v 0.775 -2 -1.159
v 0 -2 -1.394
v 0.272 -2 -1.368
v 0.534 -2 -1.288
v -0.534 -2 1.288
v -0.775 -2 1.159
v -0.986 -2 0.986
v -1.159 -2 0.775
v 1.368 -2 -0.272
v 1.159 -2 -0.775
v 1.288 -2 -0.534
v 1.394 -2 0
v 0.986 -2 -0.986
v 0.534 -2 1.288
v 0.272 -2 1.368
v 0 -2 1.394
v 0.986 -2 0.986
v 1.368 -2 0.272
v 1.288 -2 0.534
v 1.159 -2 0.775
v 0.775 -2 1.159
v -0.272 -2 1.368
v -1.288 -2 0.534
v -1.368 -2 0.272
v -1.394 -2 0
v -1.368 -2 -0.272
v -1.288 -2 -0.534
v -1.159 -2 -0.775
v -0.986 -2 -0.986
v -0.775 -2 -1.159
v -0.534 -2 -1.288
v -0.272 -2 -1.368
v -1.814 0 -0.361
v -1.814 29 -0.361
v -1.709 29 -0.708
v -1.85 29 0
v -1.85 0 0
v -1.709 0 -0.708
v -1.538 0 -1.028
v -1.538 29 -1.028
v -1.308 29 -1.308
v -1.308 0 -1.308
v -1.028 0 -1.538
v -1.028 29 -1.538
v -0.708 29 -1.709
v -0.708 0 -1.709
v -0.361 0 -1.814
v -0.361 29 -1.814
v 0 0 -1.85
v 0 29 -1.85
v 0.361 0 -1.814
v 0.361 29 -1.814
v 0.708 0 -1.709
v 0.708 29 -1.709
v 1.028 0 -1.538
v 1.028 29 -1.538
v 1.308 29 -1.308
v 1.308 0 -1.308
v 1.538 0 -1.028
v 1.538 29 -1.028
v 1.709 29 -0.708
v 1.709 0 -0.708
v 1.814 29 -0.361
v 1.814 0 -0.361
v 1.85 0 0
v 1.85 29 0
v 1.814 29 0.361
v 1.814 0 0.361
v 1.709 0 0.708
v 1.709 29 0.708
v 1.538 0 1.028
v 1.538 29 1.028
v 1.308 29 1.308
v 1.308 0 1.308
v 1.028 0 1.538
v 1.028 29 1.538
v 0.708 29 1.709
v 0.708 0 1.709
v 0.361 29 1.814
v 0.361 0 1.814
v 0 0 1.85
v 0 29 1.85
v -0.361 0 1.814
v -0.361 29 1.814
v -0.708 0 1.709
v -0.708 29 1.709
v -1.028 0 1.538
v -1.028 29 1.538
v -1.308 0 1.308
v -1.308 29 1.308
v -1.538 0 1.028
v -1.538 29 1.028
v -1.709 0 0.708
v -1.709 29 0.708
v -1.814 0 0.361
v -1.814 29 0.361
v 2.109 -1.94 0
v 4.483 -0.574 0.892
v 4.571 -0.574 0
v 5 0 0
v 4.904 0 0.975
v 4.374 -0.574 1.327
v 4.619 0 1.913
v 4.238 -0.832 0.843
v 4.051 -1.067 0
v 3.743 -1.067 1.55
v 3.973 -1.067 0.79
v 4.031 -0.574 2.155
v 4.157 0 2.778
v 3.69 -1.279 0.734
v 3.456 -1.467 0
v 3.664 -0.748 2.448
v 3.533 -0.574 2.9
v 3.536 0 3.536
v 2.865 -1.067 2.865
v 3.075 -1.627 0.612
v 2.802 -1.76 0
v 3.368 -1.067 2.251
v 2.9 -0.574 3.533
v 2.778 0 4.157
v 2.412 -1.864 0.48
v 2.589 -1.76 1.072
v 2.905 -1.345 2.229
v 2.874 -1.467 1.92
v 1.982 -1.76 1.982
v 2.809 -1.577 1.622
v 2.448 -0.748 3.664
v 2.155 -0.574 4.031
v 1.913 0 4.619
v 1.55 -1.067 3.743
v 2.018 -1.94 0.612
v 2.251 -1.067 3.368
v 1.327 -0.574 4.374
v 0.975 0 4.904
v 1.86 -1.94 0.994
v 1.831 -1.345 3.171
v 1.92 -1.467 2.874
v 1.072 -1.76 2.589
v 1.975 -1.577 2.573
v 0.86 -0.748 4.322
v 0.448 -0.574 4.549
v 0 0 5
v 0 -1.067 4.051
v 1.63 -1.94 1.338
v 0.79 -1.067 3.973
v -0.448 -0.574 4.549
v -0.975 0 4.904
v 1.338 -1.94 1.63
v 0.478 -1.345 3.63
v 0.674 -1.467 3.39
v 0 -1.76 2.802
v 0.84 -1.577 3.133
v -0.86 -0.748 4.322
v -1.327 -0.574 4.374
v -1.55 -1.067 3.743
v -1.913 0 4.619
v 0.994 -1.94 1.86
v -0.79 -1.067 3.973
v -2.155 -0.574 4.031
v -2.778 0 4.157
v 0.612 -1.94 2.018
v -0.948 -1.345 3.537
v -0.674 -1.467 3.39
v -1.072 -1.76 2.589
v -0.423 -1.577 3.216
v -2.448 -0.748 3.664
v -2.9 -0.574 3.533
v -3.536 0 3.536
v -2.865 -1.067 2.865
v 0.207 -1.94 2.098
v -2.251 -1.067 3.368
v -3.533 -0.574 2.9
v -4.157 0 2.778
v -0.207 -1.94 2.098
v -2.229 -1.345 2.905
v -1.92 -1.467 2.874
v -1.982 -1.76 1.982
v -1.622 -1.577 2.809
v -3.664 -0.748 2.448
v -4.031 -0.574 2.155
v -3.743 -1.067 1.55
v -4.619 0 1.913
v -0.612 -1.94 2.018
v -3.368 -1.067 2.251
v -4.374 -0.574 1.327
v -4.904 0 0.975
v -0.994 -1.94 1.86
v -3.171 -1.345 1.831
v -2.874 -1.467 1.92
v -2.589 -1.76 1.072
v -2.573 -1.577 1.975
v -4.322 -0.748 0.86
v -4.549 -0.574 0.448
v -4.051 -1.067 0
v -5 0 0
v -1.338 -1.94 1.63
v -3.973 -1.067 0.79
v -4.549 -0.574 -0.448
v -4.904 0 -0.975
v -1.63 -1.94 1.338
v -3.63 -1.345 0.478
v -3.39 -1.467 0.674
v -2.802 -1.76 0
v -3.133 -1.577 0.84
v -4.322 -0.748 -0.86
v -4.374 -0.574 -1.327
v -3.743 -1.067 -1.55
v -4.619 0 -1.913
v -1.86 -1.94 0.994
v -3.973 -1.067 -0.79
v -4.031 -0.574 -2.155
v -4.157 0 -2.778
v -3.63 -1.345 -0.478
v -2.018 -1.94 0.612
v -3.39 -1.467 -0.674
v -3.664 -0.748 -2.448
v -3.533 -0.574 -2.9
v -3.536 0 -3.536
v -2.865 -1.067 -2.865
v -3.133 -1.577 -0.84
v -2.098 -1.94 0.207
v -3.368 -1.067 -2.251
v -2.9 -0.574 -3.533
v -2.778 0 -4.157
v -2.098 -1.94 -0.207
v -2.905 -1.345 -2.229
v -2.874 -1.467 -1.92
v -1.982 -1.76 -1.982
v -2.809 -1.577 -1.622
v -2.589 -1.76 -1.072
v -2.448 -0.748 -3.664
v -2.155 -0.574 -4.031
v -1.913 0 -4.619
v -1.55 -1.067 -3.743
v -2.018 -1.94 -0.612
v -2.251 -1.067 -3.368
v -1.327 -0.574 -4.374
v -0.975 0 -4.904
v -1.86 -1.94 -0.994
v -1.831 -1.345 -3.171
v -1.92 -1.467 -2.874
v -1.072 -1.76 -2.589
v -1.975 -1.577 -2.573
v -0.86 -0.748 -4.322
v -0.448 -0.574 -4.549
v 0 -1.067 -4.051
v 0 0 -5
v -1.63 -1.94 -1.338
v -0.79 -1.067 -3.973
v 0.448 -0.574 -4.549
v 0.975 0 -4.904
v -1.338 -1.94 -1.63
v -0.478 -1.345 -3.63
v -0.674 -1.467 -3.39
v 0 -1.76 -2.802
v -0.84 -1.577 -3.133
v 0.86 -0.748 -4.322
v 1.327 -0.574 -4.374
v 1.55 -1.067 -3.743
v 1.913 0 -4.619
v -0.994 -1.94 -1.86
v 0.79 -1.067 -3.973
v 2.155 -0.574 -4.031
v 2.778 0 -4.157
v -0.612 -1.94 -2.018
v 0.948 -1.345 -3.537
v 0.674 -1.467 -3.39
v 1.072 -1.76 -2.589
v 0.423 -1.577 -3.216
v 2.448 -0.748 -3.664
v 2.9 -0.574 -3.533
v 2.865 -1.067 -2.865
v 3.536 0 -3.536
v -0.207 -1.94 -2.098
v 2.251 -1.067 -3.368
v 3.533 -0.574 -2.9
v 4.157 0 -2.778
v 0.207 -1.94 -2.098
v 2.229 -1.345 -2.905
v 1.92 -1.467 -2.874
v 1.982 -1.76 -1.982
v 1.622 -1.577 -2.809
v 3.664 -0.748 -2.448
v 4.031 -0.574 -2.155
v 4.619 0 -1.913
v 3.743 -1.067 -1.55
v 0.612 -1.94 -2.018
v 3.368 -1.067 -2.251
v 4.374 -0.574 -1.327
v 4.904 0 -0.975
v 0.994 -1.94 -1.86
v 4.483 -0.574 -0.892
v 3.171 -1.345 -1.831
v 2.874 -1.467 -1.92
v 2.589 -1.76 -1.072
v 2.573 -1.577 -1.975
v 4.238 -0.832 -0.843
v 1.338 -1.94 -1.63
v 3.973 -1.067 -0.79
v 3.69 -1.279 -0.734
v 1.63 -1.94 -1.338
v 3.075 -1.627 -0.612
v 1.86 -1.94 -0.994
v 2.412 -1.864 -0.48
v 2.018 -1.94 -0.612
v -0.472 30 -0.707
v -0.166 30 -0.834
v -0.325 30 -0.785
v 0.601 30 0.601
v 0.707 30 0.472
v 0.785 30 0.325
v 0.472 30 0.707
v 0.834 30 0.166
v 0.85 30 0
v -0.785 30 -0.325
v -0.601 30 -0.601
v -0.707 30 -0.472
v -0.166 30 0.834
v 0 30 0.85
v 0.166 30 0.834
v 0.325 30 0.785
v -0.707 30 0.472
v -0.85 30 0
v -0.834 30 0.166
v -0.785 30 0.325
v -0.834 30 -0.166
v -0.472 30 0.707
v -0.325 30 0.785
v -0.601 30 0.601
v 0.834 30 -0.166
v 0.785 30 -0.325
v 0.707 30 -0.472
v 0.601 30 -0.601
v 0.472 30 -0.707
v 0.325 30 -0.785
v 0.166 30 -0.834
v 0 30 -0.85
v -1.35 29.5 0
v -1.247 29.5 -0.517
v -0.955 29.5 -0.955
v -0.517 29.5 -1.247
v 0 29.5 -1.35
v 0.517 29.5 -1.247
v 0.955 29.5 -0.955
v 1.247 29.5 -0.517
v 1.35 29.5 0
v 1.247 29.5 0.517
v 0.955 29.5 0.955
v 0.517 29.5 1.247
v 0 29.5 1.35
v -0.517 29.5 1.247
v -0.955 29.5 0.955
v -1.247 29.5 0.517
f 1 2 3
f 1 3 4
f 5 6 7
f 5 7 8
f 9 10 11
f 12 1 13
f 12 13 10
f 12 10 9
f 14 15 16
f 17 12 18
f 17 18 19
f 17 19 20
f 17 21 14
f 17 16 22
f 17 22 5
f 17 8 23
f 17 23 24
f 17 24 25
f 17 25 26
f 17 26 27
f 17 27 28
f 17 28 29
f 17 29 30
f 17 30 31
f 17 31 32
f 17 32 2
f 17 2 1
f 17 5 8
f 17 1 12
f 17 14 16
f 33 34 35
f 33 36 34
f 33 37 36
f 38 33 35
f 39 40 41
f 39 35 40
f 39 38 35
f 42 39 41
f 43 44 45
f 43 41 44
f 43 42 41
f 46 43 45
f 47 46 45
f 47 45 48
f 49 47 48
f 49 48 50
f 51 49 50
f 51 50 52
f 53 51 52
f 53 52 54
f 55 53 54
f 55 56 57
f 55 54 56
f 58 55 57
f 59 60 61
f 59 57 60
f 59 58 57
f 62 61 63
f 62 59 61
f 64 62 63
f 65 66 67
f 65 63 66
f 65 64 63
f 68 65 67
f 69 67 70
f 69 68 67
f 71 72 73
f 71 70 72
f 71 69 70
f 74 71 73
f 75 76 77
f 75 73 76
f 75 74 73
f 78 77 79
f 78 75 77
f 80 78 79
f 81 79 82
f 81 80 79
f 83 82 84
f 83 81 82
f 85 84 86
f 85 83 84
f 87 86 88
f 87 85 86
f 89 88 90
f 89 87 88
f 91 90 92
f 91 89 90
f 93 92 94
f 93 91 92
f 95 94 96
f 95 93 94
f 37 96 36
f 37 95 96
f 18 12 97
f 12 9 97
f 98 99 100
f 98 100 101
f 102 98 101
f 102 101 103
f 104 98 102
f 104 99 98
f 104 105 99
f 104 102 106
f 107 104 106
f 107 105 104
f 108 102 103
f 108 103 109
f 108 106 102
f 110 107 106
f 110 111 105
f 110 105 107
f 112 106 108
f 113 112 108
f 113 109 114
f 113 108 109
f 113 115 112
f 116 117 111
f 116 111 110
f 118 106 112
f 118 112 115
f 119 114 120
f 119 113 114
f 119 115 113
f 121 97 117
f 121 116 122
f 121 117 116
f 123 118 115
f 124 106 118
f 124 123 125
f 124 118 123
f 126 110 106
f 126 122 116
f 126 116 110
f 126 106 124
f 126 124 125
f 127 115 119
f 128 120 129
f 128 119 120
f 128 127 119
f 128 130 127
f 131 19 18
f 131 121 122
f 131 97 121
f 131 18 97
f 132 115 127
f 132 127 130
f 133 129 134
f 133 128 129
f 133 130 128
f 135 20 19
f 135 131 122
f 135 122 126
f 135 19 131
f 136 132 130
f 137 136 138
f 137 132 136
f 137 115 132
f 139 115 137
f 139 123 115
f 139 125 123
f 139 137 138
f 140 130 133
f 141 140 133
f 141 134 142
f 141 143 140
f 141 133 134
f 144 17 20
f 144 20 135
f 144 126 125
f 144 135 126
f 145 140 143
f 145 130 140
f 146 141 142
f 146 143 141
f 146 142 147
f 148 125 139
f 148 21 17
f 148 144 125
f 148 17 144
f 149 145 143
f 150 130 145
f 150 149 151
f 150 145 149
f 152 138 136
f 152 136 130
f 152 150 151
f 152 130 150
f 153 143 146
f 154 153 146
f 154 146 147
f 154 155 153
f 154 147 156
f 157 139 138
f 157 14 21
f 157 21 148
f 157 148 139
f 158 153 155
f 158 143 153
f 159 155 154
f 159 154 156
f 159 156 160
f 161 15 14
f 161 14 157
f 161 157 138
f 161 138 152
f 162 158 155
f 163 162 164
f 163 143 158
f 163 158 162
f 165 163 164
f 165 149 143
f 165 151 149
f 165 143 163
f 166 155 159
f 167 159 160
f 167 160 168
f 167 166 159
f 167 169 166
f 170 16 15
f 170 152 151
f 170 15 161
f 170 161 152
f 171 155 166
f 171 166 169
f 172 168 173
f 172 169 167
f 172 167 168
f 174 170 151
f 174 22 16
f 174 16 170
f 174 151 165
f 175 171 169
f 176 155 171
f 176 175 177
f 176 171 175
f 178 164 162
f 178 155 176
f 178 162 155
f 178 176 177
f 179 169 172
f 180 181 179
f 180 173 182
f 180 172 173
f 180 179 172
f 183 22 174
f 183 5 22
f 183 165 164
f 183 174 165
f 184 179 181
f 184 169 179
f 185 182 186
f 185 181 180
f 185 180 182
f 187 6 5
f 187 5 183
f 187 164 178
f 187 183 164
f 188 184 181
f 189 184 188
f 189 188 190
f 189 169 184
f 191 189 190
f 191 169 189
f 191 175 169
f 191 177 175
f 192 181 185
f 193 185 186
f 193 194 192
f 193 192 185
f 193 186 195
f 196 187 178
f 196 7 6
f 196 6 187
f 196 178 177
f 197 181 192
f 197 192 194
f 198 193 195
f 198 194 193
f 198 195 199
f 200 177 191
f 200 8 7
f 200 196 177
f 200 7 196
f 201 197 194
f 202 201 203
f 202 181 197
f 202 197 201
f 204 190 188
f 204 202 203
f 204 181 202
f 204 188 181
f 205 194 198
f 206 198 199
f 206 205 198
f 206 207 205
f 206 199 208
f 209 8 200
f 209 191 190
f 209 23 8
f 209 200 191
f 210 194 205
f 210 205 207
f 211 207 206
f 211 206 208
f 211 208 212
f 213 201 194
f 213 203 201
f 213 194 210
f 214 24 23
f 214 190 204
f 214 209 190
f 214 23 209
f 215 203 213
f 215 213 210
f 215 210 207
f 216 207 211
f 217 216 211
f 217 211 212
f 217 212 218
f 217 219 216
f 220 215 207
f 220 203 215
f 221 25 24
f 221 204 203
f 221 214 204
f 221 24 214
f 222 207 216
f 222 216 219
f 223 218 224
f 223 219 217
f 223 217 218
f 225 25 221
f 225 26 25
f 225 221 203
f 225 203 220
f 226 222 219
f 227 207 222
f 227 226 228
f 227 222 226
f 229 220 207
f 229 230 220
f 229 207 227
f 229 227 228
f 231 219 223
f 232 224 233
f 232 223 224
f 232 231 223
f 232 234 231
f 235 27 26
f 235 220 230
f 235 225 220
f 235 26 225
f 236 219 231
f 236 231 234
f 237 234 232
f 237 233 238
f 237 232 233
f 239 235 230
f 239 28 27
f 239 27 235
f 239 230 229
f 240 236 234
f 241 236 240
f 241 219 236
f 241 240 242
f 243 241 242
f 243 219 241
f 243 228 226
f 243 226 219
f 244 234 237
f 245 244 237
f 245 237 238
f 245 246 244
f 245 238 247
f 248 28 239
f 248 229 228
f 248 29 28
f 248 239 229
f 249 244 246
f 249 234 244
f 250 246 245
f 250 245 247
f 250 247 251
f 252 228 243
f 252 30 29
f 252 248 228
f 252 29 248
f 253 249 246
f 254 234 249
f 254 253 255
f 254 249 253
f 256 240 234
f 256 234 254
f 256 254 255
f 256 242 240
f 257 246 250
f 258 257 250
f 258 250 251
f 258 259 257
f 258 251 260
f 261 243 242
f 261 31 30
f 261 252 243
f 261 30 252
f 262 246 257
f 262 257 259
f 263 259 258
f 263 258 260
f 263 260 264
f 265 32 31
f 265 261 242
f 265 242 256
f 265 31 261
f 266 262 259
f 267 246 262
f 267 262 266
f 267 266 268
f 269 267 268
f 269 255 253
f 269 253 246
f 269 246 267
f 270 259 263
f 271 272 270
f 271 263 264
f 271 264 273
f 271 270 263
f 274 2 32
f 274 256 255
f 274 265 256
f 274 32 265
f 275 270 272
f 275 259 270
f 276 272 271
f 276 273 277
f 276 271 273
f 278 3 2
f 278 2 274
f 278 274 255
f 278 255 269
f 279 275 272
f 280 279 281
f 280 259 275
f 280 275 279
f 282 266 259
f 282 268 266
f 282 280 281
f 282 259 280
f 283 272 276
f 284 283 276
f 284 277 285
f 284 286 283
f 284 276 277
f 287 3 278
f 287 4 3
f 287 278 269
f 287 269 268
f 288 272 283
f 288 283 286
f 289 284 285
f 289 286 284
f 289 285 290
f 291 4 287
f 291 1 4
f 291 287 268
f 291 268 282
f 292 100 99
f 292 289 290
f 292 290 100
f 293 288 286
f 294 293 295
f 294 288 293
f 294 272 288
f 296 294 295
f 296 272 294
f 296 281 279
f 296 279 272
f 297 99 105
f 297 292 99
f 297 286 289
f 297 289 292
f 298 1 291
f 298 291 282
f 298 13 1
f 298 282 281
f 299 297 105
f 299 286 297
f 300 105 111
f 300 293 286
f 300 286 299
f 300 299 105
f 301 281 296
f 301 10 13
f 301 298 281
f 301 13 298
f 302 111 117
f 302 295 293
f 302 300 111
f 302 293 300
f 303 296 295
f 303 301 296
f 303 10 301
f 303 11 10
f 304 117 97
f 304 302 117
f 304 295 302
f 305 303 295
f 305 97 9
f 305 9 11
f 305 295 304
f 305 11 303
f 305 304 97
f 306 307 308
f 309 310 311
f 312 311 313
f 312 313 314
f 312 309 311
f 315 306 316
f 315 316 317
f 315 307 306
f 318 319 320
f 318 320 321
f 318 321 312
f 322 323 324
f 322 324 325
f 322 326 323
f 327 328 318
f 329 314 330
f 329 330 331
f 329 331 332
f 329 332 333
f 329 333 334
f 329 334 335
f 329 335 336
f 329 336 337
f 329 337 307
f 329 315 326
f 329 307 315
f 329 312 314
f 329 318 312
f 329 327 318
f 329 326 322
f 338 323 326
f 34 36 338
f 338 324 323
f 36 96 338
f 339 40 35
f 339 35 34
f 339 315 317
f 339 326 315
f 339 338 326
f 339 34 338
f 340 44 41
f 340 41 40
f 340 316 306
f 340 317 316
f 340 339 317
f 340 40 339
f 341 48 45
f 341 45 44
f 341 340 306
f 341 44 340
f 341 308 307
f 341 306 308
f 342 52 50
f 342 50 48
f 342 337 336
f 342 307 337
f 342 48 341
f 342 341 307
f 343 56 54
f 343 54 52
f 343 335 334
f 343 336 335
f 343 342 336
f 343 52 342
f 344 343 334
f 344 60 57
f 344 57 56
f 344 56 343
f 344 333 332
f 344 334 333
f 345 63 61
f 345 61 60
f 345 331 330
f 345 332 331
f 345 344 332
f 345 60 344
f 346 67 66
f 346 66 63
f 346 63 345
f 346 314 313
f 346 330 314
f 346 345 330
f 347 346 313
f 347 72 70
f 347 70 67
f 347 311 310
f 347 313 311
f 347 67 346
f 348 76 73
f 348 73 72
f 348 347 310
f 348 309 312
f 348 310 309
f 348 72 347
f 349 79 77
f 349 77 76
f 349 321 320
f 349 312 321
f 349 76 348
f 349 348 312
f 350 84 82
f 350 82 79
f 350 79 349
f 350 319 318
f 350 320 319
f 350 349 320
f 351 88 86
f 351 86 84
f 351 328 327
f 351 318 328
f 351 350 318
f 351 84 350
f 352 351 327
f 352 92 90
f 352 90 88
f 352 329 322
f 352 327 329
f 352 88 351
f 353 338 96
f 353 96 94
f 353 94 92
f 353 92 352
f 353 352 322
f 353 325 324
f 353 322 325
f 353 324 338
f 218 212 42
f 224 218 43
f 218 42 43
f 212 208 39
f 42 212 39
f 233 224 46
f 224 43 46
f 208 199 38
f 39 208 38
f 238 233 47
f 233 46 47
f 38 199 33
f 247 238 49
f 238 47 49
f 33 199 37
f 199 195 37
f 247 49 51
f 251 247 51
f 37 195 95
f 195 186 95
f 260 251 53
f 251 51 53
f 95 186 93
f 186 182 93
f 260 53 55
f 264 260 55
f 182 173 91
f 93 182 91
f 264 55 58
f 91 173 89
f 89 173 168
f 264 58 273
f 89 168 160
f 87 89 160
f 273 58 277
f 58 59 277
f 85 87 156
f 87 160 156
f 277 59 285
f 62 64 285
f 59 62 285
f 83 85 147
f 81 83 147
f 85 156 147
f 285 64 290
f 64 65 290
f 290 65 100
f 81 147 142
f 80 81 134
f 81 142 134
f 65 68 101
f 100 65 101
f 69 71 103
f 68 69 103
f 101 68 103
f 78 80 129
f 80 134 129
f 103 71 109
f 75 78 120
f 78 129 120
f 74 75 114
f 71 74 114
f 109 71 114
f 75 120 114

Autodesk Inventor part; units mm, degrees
ref_plane "YZ Plane" through (0, 0, 0) normal (1, 0, 0) x (0, 1, 0)
ref_plane "XZ Plane" through (0, 0, 0) normal (0, 1, 0) x (-1, 0, 0)
ref_plane "XY Plane" through (0, 0, 0) normal (0, 0, 1) x (1, 0, 0)
sketch "Sketch1" plane through (0, 0, 0) normal (0, 1, 0) x (-1, 0, 0)
  circle A0 centre (0, 0) radius 1.85
  dimension "d0" = 3.7
extrude "Extrusion1" add sketch "Sketch1" along normal blind 30
sketch "Sketch2" plane through (0, 0, 0) normal (0, -1, 0) x (1, 0, 0)
  circle A0 centre (0, 0) radius 5
  dimension "d3" = 10
extrude "Extrusion2" add sketch "Sketch2" along normal blind 2
chamfer "Chamfer1" distance 1 angle 45 1 edges at (1.85, 30, 0)
fillet "Fillet1" radius 4.25 1 edges at (-5, -2, 0)
properties part number "Pin"
